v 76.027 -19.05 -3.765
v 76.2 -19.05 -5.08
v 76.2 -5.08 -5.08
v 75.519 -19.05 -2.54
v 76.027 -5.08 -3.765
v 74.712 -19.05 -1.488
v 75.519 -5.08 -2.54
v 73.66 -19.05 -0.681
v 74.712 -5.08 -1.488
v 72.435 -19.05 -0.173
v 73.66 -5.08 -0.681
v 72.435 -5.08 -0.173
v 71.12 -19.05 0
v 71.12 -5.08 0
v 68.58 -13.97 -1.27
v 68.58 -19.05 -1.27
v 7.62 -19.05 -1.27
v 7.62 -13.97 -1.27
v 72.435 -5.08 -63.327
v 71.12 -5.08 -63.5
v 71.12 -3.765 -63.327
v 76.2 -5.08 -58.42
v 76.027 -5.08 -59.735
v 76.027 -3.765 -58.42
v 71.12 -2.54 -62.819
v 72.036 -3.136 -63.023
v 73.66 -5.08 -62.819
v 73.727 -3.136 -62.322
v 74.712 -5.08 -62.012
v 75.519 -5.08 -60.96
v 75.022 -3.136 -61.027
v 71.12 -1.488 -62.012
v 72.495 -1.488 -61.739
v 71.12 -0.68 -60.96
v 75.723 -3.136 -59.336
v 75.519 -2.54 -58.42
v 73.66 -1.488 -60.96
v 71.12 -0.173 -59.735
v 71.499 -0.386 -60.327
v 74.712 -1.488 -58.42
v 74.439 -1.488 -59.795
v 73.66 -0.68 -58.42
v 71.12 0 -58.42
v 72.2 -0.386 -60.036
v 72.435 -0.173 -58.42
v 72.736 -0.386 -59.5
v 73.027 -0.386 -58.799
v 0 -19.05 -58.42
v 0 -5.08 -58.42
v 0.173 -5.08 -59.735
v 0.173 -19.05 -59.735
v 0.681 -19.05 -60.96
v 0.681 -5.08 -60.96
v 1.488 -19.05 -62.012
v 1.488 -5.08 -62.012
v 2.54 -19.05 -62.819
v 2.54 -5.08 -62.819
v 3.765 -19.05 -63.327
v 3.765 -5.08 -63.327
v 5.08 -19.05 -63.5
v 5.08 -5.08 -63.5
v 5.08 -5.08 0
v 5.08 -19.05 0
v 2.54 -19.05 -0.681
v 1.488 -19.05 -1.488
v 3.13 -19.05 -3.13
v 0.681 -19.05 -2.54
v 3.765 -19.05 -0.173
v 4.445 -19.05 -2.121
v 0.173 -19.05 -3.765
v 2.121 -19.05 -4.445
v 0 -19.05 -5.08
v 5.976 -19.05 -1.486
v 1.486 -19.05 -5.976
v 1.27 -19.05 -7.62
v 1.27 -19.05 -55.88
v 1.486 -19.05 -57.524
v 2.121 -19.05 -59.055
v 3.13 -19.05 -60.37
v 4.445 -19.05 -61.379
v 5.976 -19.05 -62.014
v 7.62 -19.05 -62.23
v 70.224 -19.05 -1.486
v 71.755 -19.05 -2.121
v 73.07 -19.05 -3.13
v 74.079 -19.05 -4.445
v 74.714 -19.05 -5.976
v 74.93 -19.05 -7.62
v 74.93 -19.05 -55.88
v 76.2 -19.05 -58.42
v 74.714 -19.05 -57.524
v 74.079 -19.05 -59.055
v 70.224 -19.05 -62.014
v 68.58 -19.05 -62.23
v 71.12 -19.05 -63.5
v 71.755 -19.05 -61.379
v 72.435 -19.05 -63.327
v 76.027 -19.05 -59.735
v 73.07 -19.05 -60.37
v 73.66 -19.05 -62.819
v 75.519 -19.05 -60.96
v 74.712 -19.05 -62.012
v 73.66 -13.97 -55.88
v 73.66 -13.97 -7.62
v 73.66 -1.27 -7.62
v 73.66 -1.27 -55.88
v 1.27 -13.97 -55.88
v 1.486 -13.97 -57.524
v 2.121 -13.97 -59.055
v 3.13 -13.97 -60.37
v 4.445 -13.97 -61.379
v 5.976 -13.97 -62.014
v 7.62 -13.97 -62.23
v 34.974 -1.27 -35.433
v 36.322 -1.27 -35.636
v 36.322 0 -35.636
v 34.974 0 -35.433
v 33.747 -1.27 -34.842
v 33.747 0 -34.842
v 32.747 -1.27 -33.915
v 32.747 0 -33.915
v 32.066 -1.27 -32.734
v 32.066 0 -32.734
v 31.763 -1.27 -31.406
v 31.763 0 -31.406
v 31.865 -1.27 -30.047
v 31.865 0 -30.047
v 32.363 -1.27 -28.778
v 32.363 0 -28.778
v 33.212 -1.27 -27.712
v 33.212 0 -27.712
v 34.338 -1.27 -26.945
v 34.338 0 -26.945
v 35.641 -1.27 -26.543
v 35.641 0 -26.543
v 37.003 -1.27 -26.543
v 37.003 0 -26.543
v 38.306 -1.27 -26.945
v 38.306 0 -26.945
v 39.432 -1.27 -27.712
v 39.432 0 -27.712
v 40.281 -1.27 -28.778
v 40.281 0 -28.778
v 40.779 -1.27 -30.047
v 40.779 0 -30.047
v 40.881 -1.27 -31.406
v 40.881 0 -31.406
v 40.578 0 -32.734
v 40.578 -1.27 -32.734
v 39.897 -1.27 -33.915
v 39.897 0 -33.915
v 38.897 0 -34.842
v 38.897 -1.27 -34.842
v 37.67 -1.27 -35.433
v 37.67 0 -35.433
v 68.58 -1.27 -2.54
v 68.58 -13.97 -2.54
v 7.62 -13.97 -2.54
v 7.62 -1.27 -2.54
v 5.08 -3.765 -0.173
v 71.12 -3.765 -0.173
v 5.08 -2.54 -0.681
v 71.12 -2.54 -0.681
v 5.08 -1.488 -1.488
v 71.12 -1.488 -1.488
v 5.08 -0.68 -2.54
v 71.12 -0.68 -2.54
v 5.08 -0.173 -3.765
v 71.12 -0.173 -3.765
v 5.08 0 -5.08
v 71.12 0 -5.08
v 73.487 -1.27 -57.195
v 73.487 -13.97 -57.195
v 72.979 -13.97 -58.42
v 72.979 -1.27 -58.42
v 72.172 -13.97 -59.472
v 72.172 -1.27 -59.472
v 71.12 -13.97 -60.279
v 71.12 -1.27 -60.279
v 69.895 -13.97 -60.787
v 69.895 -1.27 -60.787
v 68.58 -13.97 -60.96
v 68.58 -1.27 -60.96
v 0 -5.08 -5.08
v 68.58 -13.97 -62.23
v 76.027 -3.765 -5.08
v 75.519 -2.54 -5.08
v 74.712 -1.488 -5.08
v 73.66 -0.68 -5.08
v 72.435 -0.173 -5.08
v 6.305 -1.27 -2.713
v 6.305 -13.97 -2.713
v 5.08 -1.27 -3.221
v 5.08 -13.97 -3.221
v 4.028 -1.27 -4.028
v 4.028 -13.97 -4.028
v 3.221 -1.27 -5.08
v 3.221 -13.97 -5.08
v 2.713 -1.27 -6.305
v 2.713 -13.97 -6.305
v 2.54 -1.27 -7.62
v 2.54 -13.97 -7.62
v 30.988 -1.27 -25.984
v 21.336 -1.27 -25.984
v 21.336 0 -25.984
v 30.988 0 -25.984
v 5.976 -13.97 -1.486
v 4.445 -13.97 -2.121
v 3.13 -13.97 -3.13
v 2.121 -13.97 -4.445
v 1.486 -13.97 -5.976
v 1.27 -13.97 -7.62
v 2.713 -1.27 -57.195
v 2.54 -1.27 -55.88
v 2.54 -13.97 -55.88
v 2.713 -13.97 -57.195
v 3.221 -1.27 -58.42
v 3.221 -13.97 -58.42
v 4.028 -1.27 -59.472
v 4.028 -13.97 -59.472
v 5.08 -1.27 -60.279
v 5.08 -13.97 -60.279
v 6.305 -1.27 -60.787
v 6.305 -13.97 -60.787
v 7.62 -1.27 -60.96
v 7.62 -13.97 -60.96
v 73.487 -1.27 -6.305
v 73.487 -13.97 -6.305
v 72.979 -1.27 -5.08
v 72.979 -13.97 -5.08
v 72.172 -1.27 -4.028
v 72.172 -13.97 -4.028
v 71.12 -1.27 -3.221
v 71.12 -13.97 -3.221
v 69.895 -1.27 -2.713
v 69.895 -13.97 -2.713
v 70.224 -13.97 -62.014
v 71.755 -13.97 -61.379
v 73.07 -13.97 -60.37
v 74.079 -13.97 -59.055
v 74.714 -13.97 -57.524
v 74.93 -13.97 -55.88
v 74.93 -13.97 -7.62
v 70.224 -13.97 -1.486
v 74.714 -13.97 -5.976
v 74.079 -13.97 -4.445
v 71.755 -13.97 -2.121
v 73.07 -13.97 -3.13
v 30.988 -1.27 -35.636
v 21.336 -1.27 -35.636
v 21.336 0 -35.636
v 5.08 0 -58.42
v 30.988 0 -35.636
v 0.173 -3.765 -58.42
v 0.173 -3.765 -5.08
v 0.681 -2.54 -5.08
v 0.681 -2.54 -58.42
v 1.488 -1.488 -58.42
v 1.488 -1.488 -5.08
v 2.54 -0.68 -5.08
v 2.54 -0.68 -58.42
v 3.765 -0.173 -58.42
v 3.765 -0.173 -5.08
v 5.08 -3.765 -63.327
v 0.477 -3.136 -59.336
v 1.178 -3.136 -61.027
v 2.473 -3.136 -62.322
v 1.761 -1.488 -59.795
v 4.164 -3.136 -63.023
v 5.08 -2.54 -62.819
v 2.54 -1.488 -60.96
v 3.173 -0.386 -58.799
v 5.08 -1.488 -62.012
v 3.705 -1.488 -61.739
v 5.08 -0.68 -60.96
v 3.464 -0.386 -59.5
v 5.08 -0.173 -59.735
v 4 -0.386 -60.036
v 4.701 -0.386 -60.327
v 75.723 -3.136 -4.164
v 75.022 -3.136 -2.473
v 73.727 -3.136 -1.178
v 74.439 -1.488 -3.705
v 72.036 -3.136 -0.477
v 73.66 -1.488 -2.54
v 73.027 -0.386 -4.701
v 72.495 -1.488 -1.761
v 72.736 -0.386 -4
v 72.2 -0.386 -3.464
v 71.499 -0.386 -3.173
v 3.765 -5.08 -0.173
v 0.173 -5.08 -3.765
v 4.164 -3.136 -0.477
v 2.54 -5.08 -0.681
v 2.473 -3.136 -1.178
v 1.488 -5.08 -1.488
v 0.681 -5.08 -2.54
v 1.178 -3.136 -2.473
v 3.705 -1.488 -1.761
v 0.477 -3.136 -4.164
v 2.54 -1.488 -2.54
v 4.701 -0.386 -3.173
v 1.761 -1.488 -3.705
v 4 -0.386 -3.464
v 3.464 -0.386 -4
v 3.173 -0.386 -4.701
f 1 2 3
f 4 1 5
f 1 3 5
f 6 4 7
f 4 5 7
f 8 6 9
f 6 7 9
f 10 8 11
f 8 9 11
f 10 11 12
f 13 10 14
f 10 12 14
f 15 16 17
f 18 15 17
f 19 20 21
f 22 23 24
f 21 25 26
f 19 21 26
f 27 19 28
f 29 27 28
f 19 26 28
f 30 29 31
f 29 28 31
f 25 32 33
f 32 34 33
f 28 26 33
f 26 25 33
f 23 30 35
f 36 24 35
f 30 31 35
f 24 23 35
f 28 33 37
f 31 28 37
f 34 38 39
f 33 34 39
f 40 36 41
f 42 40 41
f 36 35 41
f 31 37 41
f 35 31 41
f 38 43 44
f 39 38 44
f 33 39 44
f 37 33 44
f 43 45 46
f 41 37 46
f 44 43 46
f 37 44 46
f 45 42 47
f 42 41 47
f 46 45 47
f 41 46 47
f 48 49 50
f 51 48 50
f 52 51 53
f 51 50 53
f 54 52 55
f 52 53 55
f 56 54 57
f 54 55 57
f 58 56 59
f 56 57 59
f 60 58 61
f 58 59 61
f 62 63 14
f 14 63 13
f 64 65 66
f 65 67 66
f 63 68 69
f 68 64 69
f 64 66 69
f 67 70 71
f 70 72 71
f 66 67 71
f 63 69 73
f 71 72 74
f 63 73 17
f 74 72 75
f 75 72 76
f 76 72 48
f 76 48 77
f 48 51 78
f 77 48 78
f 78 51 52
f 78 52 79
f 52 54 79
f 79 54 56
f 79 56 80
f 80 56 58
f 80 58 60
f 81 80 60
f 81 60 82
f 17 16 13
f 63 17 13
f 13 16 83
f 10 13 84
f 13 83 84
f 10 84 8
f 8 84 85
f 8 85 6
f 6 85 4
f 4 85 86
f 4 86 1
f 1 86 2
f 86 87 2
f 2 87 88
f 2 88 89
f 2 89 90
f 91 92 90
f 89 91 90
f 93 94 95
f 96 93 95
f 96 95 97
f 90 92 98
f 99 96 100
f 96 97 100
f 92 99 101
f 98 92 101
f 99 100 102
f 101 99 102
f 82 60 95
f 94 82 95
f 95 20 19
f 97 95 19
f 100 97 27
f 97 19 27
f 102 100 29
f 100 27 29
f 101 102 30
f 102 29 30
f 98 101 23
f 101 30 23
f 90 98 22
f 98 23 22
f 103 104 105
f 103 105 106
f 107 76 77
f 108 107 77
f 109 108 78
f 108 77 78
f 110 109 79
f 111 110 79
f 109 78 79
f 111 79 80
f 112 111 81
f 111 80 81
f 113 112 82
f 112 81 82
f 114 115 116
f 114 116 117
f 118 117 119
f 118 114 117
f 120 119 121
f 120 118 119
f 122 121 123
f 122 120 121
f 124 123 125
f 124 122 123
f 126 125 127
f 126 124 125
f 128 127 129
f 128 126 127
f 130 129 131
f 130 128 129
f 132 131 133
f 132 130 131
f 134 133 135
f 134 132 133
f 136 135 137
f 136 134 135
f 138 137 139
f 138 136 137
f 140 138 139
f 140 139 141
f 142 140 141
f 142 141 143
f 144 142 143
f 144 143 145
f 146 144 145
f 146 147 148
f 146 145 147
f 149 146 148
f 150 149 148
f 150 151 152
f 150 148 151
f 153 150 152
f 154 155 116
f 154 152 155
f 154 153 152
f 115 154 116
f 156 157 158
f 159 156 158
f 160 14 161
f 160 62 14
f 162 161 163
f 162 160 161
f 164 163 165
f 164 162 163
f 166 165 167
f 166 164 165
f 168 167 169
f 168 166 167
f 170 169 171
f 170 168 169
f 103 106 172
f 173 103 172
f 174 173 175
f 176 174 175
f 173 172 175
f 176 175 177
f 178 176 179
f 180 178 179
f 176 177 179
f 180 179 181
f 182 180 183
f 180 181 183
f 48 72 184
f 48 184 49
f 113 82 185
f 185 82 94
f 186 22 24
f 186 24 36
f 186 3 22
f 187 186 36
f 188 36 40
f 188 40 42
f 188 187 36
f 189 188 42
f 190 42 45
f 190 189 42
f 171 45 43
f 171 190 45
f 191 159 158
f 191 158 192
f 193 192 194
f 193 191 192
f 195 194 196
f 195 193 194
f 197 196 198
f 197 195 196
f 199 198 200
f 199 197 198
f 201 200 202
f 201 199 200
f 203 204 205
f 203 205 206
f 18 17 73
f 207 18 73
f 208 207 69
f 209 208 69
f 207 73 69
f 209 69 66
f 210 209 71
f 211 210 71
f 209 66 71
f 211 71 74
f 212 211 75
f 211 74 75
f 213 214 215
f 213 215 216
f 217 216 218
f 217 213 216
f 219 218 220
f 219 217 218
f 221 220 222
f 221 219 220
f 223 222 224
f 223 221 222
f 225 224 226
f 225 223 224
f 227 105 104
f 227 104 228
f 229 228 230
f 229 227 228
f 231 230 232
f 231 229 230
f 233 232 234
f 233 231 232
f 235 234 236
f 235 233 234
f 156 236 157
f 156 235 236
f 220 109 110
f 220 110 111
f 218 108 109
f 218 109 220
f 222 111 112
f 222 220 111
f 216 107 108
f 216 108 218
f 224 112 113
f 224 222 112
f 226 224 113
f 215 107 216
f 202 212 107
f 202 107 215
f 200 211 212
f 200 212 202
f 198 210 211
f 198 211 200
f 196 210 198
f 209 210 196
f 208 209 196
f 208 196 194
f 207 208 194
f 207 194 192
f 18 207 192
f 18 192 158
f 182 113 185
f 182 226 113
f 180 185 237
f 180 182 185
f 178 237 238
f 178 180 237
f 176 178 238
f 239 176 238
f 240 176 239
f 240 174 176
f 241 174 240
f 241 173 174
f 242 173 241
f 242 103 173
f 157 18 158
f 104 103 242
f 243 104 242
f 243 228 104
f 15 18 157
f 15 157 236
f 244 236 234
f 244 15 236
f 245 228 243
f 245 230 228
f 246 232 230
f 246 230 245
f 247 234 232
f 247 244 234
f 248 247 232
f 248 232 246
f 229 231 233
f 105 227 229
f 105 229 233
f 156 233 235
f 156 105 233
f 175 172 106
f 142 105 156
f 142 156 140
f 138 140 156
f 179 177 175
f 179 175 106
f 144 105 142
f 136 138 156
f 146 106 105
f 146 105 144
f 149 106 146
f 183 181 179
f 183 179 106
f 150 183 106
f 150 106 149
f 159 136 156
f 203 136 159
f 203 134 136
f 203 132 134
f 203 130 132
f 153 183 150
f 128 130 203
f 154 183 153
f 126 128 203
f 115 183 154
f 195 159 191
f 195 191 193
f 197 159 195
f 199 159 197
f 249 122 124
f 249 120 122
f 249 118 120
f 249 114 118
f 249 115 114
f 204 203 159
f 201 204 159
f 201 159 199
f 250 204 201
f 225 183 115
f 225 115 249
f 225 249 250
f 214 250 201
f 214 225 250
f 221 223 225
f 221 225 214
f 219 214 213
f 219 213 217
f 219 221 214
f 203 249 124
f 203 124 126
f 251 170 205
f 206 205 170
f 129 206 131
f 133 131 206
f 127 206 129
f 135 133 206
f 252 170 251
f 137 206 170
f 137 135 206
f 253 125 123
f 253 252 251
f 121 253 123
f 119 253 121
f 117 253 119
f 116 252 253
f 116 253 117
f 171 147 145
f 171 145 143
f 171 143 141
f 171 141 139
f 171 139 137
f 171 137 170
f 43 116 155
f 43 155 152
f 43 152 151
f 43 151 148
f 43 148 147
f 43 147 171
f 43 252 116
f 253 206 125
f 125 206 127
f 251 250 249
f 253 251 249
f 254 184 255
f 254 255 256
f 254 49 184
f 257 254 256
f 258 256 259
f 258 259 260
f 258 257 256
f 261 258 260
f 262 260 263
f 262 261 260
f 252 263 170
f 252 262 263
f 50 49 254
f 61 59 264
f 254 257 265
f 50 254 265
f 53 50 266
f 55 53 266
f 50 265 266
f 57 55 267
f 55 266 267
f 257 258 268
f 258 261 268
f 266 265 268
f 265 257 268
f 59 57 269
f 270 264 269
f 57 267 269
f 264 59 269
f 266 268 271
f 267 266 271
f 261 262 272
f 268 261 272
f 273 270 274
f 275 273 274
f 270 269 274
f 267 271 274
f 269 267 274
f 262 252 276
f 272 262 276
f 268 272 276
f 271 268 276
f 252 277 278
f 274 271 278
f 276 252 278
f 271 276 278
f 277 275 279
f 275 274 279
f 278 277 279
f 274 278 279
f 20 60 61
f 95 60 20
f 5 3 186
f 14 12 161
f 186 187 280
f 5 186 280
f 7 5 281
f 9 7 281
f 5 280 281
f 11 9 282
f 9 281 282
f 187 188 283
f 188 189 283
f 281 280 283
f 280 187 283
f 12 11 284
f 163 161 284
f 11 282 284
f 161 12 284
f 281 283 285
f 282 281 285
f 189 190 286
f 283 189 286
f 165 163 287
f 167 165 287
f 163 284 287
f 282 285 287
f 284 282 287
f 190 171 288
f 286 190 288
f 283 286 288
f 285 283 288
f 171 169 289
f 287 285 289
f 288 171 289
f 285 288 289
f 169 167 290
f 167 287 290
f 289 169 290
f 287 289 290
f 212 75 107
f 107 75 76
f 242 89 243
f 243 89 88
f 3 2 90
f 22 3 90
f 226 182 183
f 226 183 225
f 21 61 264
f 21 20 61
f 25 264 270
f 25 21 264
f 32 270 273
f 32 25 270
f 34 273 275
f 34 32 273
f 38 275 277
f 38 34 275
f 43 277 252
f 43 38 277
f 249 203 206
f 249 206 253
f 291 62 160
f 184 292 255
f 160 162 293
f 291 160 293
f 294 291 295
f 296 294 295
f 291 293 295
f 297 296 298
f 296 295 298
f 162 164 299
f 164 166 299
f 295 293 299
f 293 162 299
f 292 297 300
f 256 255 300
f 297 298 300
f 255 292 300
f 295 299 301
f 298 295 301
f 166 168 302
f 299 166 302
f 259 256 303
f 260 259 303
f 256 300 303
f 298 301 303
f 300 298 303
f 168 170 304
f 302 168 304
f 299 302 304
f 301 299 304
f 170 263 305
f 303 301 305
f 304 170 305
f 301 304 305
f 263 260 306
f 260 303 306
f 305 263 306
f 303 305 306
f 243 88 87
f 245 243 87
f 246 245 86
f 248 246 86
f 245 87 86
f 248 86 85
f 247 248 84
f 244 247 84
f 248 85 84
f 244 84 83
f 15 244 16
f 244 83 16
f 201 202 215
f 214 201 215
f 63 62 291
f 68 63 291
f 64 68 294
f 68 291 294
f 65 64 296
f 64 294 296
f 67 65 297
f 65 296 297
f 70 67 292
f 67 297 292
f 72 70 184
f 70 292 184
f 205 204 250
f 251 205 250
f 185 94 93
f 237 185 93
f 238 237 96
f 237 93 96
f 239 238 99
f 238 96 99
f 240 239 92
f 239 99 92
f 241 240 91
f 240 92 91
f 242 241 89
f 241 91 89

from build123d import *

# Parameters (mm, degrees)
BOSS_EXTRUDE1_DEPTH      = 0.000254
BOSS_EXTRUDE1_DEPTH_BACK = 19.05
SKETCH2_W                = 76.2
SKETCH2_H                = 63.5
SKETCH3_W                = 71.12
SKETCH3_H                = 58.42
CUT_EXTRUDE2_DEPTH       = 17.78
CUT_EXTRUDE3_DEPTH       = 2.54
CUT_EXTRUDE3_DEPTH_BACK  = 102.002933126
SKETCH2_3_R              = 4.572
SKETCH2_3_W              = 9.652
SKETCH2_3_H              = 9.652
FILLET1_R                = 5.08
FILLET2_R                = 5.08
FILLET3_R                = 5.08
FILLET4_R                = 5.08
FILLET5_R                = 5.08
FILLET6_R                = 5.08
CUT_EXTRUDE4_DEPTH       = 5.08


with BuildPart() as part:
    # Sketch2 → Boss-Extrude1 (new, two sides: drawn at the far end of the back side and taken through both)
    with BuildSketch(Plane(origin=(0, 0, 0), x_dir=(1, 0, 0), z_dir=(0, 1, 0)).offset(-BOSS_EXTRUDE1_DEPTH_BACK)):
        with Locations((38.1, 31.75)):
            Rectangle(SKETCH2_W, SKETCH2_H)
    extrude(amount=BOSS_EXTRUDE1_DEPTH + BOSS_EXTRUDE1_DEPTH_BACK)

    # Sketch3 → Cut-Extrude2 (cut)
    with BuildSketch(Plane(origin=(0, -19.05, 0), x_dir=(-1, 0, 0), z_dir=(0, -1, 0))):
        with Locations((-38.1, 31.75)):
            Rectangle(SKETCH3_W, SKETCH3_H)
    extrude(amount=-CUT_EXTRUDE2_DEPTH, mode=Mode.SUBTRACT)

    # Sketch2<3> → Cut-Extrude3 (cut, two sides: drawn at the far end of the back side and taken through both)
    with BuildSketch(Plane(origin=(0, 0, 0), x_dir=(1, 0, 0), z_dir=(0, 1, 0)).offset(-CUT_EXTRUDE3_DEPTH_BACK)):
        with Locations((36.322, 31.064)):
            Circle(SKETCH2_3_R)
        with Locations((26.162, 30.81)):
            Rectangle(SKETCH2_3_W, SKETCH2_3_H)
    extrude(amount=CUT_EXTRUDE3_DEPTH + CUT_EXTRUDE3_DEPTH_BACK, mode=Mode.SUBTRACT)

    # Fillet1
    fillet1_edges = [part.edges().sort_by_distance(p)[0] for p in [
        (76.2, -9.524873, -63.5),
    ]]
    fillet(fillet1_edges, radius=FILLET1_R)

    # Fillet2
    fillet2_edges = [part.edges().sort_by_distance(p)[0] for p in [
        (73.66, -10.16, -60.96),
    ]]
    fillet(fillet2_edges, radius=FILLET2_R)

    # Fillet3
    fillet3_edges = [part.edges().sort_by_distance(p)[0] for p in [
        (76.2, -9.524873, 0),
        (73.66, -10.16, -2.54),
    ]]
    fillet(fillet3_edges, radius=FILLET3_R)

    # Fillet4
    fillet4_edges = [part.edges().sort_by_distance(p)[0] for p in [
        (0, -9.524873, 0),
        (2.54, -10.16, -2.54),
    ]]
    fillet(fillet4_edges, radius=FILLET4_R)

    # Fillet5
    fillet5_edges = [part.edges().sort_by_distance(p)[0] for p in [
        (0, -9.524873, -63.5),
        (2.54, -10.16, -60.96),
    ]]
    fillet(fillet5_edges, radius=FILLET5_R)

    # Fillet6
    fillet6_edges = [part.edges().sort_by_distance(p)[0] for p in [
        (1.487897552, 0.000254, -1.487897552),
        (38.1, 0.000254, 0),
        (74.712102448, 0.000254, -1.487897552),
        (76.2, 0.000254, -31.75),
        (74.712102448, 0.000254, -62.012102448),
        (38.1, 0.000254, -63.5),
        (1.487897552, 0.000254, -62.012102448),
        (0, 0.000254, -31.75),
    ]]
    fillet(fillet6_edges, radius=FILLET6_R)

    # Sketch5 → Cut-Extrude4 (cut)
    with BuildSketch(Plane.XZ.offset(19.05)):
        with BuildLine():
            Line((1.27, -7.62), (1.27, -55.88))
            ThreePointArc((1.27, -55.88), (3.129871939, -60.370128061), (7.62, -62.23))
            Line((7.62, -62.23), (68.58, -62.23))
            ThreePointArc((68.58, -62.23), (73.070128061, -60.370128061), (74.93, -55.88))
            Line((74.93, -55.88), (74.93, -7.62))
            ThreePointArc((74.93, -7.62), (73.070128061, -3.129871939), (68.58, -1.27))
            Line((68.58, -1.27), (7.62, -1.27))
            ThreePointArc((7.62, -1.27), (3.129871939, -3.129871939), (1.27, -7.62))
        make_face()
    extrude(amount=-CUT_EXTRUDE4_DEPTH, mode=Mode.SUBTRACT)


solid = part.part
